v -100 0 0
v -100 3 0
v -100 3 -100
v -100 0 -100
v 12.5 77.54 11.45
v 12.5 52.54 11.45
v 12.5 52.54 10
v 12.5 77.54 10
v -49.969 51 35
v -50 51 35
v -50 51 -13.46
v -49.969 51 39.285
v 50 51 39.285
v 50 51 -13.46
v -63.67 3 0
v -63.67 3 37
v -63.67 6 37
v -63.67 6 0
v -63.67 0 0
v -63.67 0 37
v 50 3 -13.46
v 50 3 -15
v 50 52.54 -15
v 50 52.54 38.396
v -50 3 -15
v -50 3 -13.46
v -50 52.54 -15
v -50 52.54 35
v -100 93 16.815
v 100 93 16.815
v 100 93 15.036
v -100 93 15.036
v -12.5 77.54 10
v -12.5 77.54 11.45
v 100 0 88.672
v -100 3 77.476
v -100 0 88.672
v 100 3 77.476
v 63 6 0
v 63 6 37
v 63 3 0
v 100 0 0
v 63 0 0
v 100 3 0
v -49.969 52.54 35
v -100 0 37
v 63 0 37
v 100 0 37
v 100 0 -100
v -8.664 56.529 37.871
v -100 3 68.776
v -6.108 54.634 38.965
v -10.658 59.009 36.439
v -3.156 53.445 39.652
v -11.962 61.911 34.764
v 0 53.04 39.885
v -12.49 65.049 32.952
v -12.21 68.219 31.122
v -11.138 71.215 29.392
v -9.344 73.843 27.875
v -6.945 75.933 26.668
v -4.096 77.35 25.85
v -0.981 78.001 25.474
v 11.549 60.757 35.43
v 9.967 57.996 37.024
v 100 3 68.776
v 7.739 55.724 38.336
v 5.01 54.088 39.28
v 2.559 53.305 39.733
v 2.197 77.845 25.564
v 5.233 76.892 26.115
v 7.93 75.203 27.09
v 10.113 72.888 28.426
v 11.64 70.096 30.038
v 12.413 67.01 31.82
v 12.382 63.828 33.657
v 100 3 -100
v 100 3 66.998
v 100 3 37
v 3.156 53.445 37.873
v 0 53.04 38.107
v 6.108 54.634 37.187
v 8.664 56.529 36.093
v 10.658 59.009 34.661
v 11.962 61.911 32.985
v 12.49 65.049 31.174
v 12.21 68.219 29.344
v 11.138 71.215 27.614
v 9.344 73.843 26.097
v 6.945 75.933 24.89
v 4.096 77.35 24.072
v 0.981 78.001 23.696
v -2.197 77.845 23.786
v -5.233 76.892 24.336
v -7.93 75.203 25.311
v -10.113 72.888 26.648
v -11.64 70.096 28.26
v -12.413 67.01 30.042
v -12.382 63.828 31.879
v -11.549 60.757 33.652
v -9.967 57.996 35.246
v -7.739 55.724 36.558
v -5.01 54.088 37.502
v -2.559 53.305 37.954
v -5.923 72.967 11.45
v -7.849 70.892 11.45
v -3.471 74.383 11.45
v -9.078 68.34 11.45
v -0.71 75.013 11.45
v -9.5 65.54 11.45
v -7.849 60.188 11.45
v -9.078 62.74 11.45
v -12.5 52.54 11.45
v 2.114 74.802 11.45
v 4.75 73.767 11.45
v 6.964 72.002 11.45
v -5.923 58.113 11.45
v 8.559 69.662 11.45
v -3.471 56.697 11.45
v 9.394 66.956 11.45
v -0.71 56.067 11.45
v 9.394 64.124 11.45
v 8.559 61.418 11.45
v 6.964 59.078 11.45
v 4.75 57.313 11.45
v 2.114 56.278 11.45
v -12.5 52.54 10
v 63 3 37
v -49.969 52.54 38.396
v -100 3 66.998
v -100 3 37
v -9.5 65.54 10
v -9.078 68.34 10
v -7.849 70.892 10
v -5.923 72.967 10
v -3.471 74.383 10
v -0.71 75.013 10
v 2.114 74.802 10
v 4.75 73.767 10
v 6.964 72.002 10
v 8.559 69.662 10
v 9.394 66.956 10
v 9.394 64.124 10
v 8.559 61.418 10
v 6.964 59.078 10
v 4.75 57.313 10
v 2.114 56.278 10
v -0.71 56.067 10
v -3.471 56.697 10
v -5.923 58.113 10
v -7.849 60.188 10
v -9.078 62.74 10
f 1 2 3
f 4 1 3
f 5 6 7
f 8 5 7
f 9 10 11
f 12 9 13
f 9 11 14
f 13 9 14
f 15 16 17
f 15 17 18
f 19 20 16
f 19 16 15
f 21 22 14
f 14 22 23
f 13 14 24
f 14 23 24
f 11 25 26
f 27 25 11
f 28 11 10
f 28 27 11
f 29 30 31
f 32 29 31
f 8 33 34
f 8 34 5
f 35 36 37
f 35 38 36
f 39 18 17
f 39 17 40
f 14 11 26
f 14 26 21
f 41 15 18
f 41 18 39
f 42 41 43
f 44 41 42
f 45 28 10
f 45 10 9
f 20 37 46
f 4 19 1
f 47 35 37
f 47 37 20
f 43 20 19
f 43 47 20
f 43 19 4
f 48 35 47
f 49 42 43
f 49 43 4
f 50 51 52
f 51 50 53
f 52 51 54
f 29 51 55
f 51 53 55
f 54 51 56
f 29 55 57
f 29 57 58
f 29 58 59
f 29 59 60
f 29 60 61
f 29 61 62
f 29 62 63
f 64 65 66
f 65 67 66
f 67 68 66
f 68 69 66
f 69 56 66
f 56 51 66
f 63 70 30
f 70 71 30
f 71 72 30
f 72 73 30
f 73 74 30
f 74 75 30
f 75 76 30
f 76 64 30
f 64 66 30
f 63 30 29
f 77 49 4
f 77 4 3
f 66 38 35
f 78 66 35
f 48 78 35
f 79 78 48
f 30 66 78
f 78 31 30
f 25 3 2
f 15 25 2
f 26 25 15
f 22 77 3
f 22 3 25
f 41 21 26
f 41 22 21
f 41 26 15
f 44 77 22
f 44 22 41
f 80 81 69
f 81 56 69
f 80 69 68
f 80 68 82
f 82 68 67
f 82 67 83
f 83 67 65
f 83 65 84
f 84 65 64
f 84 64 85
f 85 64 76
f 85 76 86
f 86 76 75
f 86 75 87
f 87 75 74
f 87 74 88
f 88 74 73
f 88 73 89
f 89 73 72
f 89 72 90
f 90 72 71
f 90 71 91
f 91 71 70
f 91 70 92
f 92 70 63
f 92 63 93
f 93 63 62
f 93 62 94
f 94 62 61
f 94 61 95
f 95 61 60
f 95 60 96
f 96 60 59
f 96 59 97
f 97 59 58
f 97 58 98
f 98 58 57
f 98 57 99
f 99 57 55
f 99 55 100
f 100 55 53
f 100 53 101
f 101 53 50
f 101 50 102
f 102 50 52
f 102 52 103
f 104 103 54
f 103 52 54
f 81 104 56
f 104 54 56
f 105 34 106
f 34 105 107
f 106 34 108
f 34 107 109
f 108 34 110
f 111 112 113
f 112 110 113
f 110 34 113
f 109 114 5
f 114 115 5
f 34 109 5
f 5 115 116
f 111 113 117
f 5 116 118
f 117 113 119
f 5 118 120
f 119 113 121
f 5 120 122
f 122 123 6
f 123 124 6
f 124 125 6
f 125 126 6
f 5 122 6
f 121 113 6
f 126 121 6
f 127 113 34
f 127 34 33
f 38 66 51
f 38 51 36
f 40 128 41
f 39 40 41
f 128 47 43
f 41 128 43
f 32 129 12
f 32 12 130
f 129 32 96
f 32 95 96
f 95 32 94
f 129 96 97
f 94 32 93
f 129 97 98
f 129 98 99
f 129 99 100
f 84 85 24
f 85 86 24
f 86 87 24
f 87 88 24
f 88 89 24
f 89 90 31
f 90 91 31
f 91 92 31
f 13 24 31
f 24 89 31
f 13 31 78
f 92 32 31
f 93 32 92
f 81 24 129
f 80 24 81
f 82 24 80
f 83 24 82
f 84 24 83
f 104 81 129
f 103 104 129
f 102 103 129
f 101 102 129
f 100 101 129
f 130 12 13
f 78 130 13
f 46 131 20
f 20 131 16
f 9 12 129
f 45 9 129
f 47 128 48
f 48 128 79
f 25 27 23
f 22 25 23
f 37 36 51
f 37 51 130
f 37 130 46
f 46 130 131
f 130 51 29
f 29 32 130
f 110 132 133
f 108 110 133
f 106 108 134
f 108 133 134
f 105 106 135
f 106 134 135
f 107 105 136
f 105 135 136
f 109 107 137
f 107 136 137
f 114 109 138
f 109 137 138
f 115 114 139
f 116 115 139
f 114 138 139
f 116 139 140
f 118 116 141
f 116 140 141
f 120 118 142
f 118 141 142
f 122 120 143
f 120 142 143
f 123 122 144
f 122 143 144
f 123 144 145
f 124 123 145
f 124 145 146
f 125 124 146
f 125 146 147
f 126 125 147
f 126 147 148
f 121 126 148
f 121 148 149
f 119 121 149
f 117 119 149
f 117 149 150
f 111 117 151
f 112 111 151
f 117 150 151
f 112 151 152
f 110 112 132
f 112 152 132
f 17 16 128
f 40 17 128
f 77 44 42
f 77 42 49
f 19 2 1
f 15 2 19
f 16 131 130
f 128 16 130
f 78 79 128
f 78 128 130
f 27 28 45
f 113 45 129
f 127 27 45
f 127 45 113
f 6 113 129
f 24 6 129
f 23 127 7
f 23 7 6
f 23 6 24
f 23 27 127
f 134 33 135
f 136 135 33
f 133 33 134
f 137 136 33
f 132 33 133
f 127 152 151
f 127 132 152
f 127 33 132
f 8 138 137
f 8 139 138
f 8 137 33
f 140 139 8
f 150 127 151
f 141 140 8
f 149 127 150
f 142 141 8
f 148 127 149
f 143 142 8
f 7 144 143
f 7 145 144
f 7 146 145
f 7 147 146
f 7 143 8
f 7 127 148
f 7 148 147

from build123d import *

# Parameters (mm, degrees)
SALIENTE_EXTRUIR2_DEPTH  = 100
SALIENTE_EXTRUIR3_DEPTH  = 200
CROQUIS11_W              = 37
CROQUIS11_H              = 37
CORTAR_EXTRUIR2_DEPTH    = 168.630546142
CROQUIS13_W              = 126.669935474
CROQUIS13_H              = 37
SALIENTE_EXTRUIR9_DEPTH  = 3
CROQUIS14_W              = 100
CROQUIS14_H              = 1.54
SALIENTE_EXTRUIR12_DEPTH = 50
SALIENTE_EXTRUIR13_REACH = 194.026
CROQUIS20_W              = 99.969357698
CROQUIS20_H              = 1.54
SALIENTE_EXTRUIR14_REACH = 152.336
CROQUIS21_W              = 100
CROQUIS21_H              = 1.54
CROQUIS22_W              = 25
CROQUIS22_H              = 1.45
SALIENTE_EXTRUIR15_DEPTH = 25
CROQUIS23_R              = 9.5
CORTAR_EXTRUIR9_DEPTH    = 1.45
CROQUIS24_R              = 12.5
CORTAR_EXTRUIR10_DEPTH   = 12.5


with BuildPart() as part:
    # Croquis5 → Saliente-Extruir2 (new, symmetric)
    with BuildSketch(Plane(origin=(0, 0, 0), x_dir=(0, 0, -1), z_dir=(1, 0, 0))):
        Polygon((-77.476042657, 3), (-88.67219508, 0), (100, 0), (100, 3), align=None)
    extrude(amount=SALIENTE_EXTRUIR2_DEPTH, both=True)

    # Croquis6 → Saliente-Extruir3 (add)
    with BuildSketch(Plane(origin=(100, 0, 0), x_dir=(0, 0, -1), z_dir=(1, 0, 0))):
        Polygon((-68.776042657, 3), (-16.81451843, 93), (-15.036279601, 93), (-66.997803828, 3), align=None)
    extrude(amount=-SALIENTE_EXTRUIR3_DEPTH)

    # Croquis11 → Cortar-Extruir2 (cut, through all)
    with BuildSketch(Plane(origin=(0, 3, 0), x_dir=(1, 0, 0), z_dir=(0, 1, 0))):
        with Locations((81.5, -18.5)):
            Rectangle(CROQUIS11_W, CROQUIS11_H)
        with Locations((-82.169935474, -18.5)):
            Rectangle(CROQUIS11_W, CROQUIS11_H)
    extrude(amount=-CORTAR_EXTRUIR2_DEPTH, mode=Mode.SUBTRACT)

    # Croquis13 → Saliente-Extruir9 (add)
    with BuildSketch(Plane(origin=(0, 3, 0), x_dir=(1, 0, 0), z_dir=(0, 1, 0))):
        with Locations((-0.334967737, -18.5)):
            Rectangle(CROQUIS13_W, CROQUIS13_H)
    extrude(amount=SALIENTE_EXTRUIR9_DEPTH)



with BuildPart() as body_2:
    # Croquis14 → Saliente-Extruir12 (new body)
    with BuildSketch(Plane.XY.offset(35)):
        with Locations((0, 51.77)):
            Rectangle(CROQUIS14_W, CROQUIS14_H)
    extrude(amount=-SALIENTE_EXTRUIR12_DEPTH)


with BuildPart() as part_1:
    add(part.part)

    add(body_2.part)  # Saliente-Extruir13 merges body 2
    # Saliente-Extruir13: up to this plane
    saliente_extruir13_end = Plane(origin=(-100, 93, 15.036279601), z_dir=(0, -0.4999999999999976, -0.86602540378444))
    # Croquis20 → Saliente-Extruir13 (add, up to the surface)
    with BuildSketch(Plane.XY.offset(35), mode=Mode.PRIVATE) as saliente_extruir13_sk1:
        with Locations((0.015321151, 51.77)):
            Rectangle(CROQUIS20_W, CROQUIS20_H)
    saliente_extruir13_tool1 = split(extrude(saliente_extruir13_sk1.sketch, amount=SALIENTE_EXTRUIR13_REACH, mode=Mode.PRIVATE), bisect_by=saliente_extruir13_end, keep=Keep.BOTH, mode=Mode.PRIVATE)
    add(saliente_extruir13_tool1.solids().sort_by_distance((0.015321, 51.77, 35))[0])

    # Croquis21 → Saliente-Extruir14 (add, up to next)
    with BuildSketch(Plane.XZ.offset(-51), mode=Mode.PRIVATE) as saliente_extruir14_sk1:
        with Locations((0, -14.23)):
            Rectangle(CROQUIS21_W, CROQUIS21_H)
    saliente_extruir14_tool1 = extrude(saliente_extruir14_sk1.sketch, amount=SALIENTE_EXTRUIR14_REACH, mode=Mode.PRIVATE) - part_1.part
    add(saliente_extruir14_tool1.solids().sort_by_distance((0, 51, -14.23))[0])

    # Croquis22 → Saliente-Extruir15 (add)
    with BuildSketch(Plane(origin=(0, 52.54, 0), x_dir=(1, 0, 0), z_dir=(0, 1, 0))):
        with Locations((0, -10.725)):
            Rectangle(CROQUIS22_W, CROQUIS22_H)
    extrude(amount=SALIENTE_EXTRUIR15_DEPTH)

    # Croquis23 → Cortar-Extruir9 (cut)
    with BuildSketch(Plane(origin=(0, 0, 10), x_dir=(-1, 0, 0), z_dir=(0, 0, -1))):
        with Locations((0, 65.54)):
            Circle(CROQUIS23_R)
    extrude(amount=-CORTAR_EXTRUIR9_DEPTH, mode=Mode.SUBTRACT)

    # Croquis24 → Cortar-Extruir10 (cut, symmetric)
    with BuildSketch(Plane.XY.offset(35)):
        with Locations(Location((0, 65.54, 0), (0, 0, 270))):
            Circle(CROQUIS24_R)
    extrude(amount=CORTAR_EXTRUIR10_DEPTH, both=True, mode=Mode.SUBTRACT)


solid = part_1.part
